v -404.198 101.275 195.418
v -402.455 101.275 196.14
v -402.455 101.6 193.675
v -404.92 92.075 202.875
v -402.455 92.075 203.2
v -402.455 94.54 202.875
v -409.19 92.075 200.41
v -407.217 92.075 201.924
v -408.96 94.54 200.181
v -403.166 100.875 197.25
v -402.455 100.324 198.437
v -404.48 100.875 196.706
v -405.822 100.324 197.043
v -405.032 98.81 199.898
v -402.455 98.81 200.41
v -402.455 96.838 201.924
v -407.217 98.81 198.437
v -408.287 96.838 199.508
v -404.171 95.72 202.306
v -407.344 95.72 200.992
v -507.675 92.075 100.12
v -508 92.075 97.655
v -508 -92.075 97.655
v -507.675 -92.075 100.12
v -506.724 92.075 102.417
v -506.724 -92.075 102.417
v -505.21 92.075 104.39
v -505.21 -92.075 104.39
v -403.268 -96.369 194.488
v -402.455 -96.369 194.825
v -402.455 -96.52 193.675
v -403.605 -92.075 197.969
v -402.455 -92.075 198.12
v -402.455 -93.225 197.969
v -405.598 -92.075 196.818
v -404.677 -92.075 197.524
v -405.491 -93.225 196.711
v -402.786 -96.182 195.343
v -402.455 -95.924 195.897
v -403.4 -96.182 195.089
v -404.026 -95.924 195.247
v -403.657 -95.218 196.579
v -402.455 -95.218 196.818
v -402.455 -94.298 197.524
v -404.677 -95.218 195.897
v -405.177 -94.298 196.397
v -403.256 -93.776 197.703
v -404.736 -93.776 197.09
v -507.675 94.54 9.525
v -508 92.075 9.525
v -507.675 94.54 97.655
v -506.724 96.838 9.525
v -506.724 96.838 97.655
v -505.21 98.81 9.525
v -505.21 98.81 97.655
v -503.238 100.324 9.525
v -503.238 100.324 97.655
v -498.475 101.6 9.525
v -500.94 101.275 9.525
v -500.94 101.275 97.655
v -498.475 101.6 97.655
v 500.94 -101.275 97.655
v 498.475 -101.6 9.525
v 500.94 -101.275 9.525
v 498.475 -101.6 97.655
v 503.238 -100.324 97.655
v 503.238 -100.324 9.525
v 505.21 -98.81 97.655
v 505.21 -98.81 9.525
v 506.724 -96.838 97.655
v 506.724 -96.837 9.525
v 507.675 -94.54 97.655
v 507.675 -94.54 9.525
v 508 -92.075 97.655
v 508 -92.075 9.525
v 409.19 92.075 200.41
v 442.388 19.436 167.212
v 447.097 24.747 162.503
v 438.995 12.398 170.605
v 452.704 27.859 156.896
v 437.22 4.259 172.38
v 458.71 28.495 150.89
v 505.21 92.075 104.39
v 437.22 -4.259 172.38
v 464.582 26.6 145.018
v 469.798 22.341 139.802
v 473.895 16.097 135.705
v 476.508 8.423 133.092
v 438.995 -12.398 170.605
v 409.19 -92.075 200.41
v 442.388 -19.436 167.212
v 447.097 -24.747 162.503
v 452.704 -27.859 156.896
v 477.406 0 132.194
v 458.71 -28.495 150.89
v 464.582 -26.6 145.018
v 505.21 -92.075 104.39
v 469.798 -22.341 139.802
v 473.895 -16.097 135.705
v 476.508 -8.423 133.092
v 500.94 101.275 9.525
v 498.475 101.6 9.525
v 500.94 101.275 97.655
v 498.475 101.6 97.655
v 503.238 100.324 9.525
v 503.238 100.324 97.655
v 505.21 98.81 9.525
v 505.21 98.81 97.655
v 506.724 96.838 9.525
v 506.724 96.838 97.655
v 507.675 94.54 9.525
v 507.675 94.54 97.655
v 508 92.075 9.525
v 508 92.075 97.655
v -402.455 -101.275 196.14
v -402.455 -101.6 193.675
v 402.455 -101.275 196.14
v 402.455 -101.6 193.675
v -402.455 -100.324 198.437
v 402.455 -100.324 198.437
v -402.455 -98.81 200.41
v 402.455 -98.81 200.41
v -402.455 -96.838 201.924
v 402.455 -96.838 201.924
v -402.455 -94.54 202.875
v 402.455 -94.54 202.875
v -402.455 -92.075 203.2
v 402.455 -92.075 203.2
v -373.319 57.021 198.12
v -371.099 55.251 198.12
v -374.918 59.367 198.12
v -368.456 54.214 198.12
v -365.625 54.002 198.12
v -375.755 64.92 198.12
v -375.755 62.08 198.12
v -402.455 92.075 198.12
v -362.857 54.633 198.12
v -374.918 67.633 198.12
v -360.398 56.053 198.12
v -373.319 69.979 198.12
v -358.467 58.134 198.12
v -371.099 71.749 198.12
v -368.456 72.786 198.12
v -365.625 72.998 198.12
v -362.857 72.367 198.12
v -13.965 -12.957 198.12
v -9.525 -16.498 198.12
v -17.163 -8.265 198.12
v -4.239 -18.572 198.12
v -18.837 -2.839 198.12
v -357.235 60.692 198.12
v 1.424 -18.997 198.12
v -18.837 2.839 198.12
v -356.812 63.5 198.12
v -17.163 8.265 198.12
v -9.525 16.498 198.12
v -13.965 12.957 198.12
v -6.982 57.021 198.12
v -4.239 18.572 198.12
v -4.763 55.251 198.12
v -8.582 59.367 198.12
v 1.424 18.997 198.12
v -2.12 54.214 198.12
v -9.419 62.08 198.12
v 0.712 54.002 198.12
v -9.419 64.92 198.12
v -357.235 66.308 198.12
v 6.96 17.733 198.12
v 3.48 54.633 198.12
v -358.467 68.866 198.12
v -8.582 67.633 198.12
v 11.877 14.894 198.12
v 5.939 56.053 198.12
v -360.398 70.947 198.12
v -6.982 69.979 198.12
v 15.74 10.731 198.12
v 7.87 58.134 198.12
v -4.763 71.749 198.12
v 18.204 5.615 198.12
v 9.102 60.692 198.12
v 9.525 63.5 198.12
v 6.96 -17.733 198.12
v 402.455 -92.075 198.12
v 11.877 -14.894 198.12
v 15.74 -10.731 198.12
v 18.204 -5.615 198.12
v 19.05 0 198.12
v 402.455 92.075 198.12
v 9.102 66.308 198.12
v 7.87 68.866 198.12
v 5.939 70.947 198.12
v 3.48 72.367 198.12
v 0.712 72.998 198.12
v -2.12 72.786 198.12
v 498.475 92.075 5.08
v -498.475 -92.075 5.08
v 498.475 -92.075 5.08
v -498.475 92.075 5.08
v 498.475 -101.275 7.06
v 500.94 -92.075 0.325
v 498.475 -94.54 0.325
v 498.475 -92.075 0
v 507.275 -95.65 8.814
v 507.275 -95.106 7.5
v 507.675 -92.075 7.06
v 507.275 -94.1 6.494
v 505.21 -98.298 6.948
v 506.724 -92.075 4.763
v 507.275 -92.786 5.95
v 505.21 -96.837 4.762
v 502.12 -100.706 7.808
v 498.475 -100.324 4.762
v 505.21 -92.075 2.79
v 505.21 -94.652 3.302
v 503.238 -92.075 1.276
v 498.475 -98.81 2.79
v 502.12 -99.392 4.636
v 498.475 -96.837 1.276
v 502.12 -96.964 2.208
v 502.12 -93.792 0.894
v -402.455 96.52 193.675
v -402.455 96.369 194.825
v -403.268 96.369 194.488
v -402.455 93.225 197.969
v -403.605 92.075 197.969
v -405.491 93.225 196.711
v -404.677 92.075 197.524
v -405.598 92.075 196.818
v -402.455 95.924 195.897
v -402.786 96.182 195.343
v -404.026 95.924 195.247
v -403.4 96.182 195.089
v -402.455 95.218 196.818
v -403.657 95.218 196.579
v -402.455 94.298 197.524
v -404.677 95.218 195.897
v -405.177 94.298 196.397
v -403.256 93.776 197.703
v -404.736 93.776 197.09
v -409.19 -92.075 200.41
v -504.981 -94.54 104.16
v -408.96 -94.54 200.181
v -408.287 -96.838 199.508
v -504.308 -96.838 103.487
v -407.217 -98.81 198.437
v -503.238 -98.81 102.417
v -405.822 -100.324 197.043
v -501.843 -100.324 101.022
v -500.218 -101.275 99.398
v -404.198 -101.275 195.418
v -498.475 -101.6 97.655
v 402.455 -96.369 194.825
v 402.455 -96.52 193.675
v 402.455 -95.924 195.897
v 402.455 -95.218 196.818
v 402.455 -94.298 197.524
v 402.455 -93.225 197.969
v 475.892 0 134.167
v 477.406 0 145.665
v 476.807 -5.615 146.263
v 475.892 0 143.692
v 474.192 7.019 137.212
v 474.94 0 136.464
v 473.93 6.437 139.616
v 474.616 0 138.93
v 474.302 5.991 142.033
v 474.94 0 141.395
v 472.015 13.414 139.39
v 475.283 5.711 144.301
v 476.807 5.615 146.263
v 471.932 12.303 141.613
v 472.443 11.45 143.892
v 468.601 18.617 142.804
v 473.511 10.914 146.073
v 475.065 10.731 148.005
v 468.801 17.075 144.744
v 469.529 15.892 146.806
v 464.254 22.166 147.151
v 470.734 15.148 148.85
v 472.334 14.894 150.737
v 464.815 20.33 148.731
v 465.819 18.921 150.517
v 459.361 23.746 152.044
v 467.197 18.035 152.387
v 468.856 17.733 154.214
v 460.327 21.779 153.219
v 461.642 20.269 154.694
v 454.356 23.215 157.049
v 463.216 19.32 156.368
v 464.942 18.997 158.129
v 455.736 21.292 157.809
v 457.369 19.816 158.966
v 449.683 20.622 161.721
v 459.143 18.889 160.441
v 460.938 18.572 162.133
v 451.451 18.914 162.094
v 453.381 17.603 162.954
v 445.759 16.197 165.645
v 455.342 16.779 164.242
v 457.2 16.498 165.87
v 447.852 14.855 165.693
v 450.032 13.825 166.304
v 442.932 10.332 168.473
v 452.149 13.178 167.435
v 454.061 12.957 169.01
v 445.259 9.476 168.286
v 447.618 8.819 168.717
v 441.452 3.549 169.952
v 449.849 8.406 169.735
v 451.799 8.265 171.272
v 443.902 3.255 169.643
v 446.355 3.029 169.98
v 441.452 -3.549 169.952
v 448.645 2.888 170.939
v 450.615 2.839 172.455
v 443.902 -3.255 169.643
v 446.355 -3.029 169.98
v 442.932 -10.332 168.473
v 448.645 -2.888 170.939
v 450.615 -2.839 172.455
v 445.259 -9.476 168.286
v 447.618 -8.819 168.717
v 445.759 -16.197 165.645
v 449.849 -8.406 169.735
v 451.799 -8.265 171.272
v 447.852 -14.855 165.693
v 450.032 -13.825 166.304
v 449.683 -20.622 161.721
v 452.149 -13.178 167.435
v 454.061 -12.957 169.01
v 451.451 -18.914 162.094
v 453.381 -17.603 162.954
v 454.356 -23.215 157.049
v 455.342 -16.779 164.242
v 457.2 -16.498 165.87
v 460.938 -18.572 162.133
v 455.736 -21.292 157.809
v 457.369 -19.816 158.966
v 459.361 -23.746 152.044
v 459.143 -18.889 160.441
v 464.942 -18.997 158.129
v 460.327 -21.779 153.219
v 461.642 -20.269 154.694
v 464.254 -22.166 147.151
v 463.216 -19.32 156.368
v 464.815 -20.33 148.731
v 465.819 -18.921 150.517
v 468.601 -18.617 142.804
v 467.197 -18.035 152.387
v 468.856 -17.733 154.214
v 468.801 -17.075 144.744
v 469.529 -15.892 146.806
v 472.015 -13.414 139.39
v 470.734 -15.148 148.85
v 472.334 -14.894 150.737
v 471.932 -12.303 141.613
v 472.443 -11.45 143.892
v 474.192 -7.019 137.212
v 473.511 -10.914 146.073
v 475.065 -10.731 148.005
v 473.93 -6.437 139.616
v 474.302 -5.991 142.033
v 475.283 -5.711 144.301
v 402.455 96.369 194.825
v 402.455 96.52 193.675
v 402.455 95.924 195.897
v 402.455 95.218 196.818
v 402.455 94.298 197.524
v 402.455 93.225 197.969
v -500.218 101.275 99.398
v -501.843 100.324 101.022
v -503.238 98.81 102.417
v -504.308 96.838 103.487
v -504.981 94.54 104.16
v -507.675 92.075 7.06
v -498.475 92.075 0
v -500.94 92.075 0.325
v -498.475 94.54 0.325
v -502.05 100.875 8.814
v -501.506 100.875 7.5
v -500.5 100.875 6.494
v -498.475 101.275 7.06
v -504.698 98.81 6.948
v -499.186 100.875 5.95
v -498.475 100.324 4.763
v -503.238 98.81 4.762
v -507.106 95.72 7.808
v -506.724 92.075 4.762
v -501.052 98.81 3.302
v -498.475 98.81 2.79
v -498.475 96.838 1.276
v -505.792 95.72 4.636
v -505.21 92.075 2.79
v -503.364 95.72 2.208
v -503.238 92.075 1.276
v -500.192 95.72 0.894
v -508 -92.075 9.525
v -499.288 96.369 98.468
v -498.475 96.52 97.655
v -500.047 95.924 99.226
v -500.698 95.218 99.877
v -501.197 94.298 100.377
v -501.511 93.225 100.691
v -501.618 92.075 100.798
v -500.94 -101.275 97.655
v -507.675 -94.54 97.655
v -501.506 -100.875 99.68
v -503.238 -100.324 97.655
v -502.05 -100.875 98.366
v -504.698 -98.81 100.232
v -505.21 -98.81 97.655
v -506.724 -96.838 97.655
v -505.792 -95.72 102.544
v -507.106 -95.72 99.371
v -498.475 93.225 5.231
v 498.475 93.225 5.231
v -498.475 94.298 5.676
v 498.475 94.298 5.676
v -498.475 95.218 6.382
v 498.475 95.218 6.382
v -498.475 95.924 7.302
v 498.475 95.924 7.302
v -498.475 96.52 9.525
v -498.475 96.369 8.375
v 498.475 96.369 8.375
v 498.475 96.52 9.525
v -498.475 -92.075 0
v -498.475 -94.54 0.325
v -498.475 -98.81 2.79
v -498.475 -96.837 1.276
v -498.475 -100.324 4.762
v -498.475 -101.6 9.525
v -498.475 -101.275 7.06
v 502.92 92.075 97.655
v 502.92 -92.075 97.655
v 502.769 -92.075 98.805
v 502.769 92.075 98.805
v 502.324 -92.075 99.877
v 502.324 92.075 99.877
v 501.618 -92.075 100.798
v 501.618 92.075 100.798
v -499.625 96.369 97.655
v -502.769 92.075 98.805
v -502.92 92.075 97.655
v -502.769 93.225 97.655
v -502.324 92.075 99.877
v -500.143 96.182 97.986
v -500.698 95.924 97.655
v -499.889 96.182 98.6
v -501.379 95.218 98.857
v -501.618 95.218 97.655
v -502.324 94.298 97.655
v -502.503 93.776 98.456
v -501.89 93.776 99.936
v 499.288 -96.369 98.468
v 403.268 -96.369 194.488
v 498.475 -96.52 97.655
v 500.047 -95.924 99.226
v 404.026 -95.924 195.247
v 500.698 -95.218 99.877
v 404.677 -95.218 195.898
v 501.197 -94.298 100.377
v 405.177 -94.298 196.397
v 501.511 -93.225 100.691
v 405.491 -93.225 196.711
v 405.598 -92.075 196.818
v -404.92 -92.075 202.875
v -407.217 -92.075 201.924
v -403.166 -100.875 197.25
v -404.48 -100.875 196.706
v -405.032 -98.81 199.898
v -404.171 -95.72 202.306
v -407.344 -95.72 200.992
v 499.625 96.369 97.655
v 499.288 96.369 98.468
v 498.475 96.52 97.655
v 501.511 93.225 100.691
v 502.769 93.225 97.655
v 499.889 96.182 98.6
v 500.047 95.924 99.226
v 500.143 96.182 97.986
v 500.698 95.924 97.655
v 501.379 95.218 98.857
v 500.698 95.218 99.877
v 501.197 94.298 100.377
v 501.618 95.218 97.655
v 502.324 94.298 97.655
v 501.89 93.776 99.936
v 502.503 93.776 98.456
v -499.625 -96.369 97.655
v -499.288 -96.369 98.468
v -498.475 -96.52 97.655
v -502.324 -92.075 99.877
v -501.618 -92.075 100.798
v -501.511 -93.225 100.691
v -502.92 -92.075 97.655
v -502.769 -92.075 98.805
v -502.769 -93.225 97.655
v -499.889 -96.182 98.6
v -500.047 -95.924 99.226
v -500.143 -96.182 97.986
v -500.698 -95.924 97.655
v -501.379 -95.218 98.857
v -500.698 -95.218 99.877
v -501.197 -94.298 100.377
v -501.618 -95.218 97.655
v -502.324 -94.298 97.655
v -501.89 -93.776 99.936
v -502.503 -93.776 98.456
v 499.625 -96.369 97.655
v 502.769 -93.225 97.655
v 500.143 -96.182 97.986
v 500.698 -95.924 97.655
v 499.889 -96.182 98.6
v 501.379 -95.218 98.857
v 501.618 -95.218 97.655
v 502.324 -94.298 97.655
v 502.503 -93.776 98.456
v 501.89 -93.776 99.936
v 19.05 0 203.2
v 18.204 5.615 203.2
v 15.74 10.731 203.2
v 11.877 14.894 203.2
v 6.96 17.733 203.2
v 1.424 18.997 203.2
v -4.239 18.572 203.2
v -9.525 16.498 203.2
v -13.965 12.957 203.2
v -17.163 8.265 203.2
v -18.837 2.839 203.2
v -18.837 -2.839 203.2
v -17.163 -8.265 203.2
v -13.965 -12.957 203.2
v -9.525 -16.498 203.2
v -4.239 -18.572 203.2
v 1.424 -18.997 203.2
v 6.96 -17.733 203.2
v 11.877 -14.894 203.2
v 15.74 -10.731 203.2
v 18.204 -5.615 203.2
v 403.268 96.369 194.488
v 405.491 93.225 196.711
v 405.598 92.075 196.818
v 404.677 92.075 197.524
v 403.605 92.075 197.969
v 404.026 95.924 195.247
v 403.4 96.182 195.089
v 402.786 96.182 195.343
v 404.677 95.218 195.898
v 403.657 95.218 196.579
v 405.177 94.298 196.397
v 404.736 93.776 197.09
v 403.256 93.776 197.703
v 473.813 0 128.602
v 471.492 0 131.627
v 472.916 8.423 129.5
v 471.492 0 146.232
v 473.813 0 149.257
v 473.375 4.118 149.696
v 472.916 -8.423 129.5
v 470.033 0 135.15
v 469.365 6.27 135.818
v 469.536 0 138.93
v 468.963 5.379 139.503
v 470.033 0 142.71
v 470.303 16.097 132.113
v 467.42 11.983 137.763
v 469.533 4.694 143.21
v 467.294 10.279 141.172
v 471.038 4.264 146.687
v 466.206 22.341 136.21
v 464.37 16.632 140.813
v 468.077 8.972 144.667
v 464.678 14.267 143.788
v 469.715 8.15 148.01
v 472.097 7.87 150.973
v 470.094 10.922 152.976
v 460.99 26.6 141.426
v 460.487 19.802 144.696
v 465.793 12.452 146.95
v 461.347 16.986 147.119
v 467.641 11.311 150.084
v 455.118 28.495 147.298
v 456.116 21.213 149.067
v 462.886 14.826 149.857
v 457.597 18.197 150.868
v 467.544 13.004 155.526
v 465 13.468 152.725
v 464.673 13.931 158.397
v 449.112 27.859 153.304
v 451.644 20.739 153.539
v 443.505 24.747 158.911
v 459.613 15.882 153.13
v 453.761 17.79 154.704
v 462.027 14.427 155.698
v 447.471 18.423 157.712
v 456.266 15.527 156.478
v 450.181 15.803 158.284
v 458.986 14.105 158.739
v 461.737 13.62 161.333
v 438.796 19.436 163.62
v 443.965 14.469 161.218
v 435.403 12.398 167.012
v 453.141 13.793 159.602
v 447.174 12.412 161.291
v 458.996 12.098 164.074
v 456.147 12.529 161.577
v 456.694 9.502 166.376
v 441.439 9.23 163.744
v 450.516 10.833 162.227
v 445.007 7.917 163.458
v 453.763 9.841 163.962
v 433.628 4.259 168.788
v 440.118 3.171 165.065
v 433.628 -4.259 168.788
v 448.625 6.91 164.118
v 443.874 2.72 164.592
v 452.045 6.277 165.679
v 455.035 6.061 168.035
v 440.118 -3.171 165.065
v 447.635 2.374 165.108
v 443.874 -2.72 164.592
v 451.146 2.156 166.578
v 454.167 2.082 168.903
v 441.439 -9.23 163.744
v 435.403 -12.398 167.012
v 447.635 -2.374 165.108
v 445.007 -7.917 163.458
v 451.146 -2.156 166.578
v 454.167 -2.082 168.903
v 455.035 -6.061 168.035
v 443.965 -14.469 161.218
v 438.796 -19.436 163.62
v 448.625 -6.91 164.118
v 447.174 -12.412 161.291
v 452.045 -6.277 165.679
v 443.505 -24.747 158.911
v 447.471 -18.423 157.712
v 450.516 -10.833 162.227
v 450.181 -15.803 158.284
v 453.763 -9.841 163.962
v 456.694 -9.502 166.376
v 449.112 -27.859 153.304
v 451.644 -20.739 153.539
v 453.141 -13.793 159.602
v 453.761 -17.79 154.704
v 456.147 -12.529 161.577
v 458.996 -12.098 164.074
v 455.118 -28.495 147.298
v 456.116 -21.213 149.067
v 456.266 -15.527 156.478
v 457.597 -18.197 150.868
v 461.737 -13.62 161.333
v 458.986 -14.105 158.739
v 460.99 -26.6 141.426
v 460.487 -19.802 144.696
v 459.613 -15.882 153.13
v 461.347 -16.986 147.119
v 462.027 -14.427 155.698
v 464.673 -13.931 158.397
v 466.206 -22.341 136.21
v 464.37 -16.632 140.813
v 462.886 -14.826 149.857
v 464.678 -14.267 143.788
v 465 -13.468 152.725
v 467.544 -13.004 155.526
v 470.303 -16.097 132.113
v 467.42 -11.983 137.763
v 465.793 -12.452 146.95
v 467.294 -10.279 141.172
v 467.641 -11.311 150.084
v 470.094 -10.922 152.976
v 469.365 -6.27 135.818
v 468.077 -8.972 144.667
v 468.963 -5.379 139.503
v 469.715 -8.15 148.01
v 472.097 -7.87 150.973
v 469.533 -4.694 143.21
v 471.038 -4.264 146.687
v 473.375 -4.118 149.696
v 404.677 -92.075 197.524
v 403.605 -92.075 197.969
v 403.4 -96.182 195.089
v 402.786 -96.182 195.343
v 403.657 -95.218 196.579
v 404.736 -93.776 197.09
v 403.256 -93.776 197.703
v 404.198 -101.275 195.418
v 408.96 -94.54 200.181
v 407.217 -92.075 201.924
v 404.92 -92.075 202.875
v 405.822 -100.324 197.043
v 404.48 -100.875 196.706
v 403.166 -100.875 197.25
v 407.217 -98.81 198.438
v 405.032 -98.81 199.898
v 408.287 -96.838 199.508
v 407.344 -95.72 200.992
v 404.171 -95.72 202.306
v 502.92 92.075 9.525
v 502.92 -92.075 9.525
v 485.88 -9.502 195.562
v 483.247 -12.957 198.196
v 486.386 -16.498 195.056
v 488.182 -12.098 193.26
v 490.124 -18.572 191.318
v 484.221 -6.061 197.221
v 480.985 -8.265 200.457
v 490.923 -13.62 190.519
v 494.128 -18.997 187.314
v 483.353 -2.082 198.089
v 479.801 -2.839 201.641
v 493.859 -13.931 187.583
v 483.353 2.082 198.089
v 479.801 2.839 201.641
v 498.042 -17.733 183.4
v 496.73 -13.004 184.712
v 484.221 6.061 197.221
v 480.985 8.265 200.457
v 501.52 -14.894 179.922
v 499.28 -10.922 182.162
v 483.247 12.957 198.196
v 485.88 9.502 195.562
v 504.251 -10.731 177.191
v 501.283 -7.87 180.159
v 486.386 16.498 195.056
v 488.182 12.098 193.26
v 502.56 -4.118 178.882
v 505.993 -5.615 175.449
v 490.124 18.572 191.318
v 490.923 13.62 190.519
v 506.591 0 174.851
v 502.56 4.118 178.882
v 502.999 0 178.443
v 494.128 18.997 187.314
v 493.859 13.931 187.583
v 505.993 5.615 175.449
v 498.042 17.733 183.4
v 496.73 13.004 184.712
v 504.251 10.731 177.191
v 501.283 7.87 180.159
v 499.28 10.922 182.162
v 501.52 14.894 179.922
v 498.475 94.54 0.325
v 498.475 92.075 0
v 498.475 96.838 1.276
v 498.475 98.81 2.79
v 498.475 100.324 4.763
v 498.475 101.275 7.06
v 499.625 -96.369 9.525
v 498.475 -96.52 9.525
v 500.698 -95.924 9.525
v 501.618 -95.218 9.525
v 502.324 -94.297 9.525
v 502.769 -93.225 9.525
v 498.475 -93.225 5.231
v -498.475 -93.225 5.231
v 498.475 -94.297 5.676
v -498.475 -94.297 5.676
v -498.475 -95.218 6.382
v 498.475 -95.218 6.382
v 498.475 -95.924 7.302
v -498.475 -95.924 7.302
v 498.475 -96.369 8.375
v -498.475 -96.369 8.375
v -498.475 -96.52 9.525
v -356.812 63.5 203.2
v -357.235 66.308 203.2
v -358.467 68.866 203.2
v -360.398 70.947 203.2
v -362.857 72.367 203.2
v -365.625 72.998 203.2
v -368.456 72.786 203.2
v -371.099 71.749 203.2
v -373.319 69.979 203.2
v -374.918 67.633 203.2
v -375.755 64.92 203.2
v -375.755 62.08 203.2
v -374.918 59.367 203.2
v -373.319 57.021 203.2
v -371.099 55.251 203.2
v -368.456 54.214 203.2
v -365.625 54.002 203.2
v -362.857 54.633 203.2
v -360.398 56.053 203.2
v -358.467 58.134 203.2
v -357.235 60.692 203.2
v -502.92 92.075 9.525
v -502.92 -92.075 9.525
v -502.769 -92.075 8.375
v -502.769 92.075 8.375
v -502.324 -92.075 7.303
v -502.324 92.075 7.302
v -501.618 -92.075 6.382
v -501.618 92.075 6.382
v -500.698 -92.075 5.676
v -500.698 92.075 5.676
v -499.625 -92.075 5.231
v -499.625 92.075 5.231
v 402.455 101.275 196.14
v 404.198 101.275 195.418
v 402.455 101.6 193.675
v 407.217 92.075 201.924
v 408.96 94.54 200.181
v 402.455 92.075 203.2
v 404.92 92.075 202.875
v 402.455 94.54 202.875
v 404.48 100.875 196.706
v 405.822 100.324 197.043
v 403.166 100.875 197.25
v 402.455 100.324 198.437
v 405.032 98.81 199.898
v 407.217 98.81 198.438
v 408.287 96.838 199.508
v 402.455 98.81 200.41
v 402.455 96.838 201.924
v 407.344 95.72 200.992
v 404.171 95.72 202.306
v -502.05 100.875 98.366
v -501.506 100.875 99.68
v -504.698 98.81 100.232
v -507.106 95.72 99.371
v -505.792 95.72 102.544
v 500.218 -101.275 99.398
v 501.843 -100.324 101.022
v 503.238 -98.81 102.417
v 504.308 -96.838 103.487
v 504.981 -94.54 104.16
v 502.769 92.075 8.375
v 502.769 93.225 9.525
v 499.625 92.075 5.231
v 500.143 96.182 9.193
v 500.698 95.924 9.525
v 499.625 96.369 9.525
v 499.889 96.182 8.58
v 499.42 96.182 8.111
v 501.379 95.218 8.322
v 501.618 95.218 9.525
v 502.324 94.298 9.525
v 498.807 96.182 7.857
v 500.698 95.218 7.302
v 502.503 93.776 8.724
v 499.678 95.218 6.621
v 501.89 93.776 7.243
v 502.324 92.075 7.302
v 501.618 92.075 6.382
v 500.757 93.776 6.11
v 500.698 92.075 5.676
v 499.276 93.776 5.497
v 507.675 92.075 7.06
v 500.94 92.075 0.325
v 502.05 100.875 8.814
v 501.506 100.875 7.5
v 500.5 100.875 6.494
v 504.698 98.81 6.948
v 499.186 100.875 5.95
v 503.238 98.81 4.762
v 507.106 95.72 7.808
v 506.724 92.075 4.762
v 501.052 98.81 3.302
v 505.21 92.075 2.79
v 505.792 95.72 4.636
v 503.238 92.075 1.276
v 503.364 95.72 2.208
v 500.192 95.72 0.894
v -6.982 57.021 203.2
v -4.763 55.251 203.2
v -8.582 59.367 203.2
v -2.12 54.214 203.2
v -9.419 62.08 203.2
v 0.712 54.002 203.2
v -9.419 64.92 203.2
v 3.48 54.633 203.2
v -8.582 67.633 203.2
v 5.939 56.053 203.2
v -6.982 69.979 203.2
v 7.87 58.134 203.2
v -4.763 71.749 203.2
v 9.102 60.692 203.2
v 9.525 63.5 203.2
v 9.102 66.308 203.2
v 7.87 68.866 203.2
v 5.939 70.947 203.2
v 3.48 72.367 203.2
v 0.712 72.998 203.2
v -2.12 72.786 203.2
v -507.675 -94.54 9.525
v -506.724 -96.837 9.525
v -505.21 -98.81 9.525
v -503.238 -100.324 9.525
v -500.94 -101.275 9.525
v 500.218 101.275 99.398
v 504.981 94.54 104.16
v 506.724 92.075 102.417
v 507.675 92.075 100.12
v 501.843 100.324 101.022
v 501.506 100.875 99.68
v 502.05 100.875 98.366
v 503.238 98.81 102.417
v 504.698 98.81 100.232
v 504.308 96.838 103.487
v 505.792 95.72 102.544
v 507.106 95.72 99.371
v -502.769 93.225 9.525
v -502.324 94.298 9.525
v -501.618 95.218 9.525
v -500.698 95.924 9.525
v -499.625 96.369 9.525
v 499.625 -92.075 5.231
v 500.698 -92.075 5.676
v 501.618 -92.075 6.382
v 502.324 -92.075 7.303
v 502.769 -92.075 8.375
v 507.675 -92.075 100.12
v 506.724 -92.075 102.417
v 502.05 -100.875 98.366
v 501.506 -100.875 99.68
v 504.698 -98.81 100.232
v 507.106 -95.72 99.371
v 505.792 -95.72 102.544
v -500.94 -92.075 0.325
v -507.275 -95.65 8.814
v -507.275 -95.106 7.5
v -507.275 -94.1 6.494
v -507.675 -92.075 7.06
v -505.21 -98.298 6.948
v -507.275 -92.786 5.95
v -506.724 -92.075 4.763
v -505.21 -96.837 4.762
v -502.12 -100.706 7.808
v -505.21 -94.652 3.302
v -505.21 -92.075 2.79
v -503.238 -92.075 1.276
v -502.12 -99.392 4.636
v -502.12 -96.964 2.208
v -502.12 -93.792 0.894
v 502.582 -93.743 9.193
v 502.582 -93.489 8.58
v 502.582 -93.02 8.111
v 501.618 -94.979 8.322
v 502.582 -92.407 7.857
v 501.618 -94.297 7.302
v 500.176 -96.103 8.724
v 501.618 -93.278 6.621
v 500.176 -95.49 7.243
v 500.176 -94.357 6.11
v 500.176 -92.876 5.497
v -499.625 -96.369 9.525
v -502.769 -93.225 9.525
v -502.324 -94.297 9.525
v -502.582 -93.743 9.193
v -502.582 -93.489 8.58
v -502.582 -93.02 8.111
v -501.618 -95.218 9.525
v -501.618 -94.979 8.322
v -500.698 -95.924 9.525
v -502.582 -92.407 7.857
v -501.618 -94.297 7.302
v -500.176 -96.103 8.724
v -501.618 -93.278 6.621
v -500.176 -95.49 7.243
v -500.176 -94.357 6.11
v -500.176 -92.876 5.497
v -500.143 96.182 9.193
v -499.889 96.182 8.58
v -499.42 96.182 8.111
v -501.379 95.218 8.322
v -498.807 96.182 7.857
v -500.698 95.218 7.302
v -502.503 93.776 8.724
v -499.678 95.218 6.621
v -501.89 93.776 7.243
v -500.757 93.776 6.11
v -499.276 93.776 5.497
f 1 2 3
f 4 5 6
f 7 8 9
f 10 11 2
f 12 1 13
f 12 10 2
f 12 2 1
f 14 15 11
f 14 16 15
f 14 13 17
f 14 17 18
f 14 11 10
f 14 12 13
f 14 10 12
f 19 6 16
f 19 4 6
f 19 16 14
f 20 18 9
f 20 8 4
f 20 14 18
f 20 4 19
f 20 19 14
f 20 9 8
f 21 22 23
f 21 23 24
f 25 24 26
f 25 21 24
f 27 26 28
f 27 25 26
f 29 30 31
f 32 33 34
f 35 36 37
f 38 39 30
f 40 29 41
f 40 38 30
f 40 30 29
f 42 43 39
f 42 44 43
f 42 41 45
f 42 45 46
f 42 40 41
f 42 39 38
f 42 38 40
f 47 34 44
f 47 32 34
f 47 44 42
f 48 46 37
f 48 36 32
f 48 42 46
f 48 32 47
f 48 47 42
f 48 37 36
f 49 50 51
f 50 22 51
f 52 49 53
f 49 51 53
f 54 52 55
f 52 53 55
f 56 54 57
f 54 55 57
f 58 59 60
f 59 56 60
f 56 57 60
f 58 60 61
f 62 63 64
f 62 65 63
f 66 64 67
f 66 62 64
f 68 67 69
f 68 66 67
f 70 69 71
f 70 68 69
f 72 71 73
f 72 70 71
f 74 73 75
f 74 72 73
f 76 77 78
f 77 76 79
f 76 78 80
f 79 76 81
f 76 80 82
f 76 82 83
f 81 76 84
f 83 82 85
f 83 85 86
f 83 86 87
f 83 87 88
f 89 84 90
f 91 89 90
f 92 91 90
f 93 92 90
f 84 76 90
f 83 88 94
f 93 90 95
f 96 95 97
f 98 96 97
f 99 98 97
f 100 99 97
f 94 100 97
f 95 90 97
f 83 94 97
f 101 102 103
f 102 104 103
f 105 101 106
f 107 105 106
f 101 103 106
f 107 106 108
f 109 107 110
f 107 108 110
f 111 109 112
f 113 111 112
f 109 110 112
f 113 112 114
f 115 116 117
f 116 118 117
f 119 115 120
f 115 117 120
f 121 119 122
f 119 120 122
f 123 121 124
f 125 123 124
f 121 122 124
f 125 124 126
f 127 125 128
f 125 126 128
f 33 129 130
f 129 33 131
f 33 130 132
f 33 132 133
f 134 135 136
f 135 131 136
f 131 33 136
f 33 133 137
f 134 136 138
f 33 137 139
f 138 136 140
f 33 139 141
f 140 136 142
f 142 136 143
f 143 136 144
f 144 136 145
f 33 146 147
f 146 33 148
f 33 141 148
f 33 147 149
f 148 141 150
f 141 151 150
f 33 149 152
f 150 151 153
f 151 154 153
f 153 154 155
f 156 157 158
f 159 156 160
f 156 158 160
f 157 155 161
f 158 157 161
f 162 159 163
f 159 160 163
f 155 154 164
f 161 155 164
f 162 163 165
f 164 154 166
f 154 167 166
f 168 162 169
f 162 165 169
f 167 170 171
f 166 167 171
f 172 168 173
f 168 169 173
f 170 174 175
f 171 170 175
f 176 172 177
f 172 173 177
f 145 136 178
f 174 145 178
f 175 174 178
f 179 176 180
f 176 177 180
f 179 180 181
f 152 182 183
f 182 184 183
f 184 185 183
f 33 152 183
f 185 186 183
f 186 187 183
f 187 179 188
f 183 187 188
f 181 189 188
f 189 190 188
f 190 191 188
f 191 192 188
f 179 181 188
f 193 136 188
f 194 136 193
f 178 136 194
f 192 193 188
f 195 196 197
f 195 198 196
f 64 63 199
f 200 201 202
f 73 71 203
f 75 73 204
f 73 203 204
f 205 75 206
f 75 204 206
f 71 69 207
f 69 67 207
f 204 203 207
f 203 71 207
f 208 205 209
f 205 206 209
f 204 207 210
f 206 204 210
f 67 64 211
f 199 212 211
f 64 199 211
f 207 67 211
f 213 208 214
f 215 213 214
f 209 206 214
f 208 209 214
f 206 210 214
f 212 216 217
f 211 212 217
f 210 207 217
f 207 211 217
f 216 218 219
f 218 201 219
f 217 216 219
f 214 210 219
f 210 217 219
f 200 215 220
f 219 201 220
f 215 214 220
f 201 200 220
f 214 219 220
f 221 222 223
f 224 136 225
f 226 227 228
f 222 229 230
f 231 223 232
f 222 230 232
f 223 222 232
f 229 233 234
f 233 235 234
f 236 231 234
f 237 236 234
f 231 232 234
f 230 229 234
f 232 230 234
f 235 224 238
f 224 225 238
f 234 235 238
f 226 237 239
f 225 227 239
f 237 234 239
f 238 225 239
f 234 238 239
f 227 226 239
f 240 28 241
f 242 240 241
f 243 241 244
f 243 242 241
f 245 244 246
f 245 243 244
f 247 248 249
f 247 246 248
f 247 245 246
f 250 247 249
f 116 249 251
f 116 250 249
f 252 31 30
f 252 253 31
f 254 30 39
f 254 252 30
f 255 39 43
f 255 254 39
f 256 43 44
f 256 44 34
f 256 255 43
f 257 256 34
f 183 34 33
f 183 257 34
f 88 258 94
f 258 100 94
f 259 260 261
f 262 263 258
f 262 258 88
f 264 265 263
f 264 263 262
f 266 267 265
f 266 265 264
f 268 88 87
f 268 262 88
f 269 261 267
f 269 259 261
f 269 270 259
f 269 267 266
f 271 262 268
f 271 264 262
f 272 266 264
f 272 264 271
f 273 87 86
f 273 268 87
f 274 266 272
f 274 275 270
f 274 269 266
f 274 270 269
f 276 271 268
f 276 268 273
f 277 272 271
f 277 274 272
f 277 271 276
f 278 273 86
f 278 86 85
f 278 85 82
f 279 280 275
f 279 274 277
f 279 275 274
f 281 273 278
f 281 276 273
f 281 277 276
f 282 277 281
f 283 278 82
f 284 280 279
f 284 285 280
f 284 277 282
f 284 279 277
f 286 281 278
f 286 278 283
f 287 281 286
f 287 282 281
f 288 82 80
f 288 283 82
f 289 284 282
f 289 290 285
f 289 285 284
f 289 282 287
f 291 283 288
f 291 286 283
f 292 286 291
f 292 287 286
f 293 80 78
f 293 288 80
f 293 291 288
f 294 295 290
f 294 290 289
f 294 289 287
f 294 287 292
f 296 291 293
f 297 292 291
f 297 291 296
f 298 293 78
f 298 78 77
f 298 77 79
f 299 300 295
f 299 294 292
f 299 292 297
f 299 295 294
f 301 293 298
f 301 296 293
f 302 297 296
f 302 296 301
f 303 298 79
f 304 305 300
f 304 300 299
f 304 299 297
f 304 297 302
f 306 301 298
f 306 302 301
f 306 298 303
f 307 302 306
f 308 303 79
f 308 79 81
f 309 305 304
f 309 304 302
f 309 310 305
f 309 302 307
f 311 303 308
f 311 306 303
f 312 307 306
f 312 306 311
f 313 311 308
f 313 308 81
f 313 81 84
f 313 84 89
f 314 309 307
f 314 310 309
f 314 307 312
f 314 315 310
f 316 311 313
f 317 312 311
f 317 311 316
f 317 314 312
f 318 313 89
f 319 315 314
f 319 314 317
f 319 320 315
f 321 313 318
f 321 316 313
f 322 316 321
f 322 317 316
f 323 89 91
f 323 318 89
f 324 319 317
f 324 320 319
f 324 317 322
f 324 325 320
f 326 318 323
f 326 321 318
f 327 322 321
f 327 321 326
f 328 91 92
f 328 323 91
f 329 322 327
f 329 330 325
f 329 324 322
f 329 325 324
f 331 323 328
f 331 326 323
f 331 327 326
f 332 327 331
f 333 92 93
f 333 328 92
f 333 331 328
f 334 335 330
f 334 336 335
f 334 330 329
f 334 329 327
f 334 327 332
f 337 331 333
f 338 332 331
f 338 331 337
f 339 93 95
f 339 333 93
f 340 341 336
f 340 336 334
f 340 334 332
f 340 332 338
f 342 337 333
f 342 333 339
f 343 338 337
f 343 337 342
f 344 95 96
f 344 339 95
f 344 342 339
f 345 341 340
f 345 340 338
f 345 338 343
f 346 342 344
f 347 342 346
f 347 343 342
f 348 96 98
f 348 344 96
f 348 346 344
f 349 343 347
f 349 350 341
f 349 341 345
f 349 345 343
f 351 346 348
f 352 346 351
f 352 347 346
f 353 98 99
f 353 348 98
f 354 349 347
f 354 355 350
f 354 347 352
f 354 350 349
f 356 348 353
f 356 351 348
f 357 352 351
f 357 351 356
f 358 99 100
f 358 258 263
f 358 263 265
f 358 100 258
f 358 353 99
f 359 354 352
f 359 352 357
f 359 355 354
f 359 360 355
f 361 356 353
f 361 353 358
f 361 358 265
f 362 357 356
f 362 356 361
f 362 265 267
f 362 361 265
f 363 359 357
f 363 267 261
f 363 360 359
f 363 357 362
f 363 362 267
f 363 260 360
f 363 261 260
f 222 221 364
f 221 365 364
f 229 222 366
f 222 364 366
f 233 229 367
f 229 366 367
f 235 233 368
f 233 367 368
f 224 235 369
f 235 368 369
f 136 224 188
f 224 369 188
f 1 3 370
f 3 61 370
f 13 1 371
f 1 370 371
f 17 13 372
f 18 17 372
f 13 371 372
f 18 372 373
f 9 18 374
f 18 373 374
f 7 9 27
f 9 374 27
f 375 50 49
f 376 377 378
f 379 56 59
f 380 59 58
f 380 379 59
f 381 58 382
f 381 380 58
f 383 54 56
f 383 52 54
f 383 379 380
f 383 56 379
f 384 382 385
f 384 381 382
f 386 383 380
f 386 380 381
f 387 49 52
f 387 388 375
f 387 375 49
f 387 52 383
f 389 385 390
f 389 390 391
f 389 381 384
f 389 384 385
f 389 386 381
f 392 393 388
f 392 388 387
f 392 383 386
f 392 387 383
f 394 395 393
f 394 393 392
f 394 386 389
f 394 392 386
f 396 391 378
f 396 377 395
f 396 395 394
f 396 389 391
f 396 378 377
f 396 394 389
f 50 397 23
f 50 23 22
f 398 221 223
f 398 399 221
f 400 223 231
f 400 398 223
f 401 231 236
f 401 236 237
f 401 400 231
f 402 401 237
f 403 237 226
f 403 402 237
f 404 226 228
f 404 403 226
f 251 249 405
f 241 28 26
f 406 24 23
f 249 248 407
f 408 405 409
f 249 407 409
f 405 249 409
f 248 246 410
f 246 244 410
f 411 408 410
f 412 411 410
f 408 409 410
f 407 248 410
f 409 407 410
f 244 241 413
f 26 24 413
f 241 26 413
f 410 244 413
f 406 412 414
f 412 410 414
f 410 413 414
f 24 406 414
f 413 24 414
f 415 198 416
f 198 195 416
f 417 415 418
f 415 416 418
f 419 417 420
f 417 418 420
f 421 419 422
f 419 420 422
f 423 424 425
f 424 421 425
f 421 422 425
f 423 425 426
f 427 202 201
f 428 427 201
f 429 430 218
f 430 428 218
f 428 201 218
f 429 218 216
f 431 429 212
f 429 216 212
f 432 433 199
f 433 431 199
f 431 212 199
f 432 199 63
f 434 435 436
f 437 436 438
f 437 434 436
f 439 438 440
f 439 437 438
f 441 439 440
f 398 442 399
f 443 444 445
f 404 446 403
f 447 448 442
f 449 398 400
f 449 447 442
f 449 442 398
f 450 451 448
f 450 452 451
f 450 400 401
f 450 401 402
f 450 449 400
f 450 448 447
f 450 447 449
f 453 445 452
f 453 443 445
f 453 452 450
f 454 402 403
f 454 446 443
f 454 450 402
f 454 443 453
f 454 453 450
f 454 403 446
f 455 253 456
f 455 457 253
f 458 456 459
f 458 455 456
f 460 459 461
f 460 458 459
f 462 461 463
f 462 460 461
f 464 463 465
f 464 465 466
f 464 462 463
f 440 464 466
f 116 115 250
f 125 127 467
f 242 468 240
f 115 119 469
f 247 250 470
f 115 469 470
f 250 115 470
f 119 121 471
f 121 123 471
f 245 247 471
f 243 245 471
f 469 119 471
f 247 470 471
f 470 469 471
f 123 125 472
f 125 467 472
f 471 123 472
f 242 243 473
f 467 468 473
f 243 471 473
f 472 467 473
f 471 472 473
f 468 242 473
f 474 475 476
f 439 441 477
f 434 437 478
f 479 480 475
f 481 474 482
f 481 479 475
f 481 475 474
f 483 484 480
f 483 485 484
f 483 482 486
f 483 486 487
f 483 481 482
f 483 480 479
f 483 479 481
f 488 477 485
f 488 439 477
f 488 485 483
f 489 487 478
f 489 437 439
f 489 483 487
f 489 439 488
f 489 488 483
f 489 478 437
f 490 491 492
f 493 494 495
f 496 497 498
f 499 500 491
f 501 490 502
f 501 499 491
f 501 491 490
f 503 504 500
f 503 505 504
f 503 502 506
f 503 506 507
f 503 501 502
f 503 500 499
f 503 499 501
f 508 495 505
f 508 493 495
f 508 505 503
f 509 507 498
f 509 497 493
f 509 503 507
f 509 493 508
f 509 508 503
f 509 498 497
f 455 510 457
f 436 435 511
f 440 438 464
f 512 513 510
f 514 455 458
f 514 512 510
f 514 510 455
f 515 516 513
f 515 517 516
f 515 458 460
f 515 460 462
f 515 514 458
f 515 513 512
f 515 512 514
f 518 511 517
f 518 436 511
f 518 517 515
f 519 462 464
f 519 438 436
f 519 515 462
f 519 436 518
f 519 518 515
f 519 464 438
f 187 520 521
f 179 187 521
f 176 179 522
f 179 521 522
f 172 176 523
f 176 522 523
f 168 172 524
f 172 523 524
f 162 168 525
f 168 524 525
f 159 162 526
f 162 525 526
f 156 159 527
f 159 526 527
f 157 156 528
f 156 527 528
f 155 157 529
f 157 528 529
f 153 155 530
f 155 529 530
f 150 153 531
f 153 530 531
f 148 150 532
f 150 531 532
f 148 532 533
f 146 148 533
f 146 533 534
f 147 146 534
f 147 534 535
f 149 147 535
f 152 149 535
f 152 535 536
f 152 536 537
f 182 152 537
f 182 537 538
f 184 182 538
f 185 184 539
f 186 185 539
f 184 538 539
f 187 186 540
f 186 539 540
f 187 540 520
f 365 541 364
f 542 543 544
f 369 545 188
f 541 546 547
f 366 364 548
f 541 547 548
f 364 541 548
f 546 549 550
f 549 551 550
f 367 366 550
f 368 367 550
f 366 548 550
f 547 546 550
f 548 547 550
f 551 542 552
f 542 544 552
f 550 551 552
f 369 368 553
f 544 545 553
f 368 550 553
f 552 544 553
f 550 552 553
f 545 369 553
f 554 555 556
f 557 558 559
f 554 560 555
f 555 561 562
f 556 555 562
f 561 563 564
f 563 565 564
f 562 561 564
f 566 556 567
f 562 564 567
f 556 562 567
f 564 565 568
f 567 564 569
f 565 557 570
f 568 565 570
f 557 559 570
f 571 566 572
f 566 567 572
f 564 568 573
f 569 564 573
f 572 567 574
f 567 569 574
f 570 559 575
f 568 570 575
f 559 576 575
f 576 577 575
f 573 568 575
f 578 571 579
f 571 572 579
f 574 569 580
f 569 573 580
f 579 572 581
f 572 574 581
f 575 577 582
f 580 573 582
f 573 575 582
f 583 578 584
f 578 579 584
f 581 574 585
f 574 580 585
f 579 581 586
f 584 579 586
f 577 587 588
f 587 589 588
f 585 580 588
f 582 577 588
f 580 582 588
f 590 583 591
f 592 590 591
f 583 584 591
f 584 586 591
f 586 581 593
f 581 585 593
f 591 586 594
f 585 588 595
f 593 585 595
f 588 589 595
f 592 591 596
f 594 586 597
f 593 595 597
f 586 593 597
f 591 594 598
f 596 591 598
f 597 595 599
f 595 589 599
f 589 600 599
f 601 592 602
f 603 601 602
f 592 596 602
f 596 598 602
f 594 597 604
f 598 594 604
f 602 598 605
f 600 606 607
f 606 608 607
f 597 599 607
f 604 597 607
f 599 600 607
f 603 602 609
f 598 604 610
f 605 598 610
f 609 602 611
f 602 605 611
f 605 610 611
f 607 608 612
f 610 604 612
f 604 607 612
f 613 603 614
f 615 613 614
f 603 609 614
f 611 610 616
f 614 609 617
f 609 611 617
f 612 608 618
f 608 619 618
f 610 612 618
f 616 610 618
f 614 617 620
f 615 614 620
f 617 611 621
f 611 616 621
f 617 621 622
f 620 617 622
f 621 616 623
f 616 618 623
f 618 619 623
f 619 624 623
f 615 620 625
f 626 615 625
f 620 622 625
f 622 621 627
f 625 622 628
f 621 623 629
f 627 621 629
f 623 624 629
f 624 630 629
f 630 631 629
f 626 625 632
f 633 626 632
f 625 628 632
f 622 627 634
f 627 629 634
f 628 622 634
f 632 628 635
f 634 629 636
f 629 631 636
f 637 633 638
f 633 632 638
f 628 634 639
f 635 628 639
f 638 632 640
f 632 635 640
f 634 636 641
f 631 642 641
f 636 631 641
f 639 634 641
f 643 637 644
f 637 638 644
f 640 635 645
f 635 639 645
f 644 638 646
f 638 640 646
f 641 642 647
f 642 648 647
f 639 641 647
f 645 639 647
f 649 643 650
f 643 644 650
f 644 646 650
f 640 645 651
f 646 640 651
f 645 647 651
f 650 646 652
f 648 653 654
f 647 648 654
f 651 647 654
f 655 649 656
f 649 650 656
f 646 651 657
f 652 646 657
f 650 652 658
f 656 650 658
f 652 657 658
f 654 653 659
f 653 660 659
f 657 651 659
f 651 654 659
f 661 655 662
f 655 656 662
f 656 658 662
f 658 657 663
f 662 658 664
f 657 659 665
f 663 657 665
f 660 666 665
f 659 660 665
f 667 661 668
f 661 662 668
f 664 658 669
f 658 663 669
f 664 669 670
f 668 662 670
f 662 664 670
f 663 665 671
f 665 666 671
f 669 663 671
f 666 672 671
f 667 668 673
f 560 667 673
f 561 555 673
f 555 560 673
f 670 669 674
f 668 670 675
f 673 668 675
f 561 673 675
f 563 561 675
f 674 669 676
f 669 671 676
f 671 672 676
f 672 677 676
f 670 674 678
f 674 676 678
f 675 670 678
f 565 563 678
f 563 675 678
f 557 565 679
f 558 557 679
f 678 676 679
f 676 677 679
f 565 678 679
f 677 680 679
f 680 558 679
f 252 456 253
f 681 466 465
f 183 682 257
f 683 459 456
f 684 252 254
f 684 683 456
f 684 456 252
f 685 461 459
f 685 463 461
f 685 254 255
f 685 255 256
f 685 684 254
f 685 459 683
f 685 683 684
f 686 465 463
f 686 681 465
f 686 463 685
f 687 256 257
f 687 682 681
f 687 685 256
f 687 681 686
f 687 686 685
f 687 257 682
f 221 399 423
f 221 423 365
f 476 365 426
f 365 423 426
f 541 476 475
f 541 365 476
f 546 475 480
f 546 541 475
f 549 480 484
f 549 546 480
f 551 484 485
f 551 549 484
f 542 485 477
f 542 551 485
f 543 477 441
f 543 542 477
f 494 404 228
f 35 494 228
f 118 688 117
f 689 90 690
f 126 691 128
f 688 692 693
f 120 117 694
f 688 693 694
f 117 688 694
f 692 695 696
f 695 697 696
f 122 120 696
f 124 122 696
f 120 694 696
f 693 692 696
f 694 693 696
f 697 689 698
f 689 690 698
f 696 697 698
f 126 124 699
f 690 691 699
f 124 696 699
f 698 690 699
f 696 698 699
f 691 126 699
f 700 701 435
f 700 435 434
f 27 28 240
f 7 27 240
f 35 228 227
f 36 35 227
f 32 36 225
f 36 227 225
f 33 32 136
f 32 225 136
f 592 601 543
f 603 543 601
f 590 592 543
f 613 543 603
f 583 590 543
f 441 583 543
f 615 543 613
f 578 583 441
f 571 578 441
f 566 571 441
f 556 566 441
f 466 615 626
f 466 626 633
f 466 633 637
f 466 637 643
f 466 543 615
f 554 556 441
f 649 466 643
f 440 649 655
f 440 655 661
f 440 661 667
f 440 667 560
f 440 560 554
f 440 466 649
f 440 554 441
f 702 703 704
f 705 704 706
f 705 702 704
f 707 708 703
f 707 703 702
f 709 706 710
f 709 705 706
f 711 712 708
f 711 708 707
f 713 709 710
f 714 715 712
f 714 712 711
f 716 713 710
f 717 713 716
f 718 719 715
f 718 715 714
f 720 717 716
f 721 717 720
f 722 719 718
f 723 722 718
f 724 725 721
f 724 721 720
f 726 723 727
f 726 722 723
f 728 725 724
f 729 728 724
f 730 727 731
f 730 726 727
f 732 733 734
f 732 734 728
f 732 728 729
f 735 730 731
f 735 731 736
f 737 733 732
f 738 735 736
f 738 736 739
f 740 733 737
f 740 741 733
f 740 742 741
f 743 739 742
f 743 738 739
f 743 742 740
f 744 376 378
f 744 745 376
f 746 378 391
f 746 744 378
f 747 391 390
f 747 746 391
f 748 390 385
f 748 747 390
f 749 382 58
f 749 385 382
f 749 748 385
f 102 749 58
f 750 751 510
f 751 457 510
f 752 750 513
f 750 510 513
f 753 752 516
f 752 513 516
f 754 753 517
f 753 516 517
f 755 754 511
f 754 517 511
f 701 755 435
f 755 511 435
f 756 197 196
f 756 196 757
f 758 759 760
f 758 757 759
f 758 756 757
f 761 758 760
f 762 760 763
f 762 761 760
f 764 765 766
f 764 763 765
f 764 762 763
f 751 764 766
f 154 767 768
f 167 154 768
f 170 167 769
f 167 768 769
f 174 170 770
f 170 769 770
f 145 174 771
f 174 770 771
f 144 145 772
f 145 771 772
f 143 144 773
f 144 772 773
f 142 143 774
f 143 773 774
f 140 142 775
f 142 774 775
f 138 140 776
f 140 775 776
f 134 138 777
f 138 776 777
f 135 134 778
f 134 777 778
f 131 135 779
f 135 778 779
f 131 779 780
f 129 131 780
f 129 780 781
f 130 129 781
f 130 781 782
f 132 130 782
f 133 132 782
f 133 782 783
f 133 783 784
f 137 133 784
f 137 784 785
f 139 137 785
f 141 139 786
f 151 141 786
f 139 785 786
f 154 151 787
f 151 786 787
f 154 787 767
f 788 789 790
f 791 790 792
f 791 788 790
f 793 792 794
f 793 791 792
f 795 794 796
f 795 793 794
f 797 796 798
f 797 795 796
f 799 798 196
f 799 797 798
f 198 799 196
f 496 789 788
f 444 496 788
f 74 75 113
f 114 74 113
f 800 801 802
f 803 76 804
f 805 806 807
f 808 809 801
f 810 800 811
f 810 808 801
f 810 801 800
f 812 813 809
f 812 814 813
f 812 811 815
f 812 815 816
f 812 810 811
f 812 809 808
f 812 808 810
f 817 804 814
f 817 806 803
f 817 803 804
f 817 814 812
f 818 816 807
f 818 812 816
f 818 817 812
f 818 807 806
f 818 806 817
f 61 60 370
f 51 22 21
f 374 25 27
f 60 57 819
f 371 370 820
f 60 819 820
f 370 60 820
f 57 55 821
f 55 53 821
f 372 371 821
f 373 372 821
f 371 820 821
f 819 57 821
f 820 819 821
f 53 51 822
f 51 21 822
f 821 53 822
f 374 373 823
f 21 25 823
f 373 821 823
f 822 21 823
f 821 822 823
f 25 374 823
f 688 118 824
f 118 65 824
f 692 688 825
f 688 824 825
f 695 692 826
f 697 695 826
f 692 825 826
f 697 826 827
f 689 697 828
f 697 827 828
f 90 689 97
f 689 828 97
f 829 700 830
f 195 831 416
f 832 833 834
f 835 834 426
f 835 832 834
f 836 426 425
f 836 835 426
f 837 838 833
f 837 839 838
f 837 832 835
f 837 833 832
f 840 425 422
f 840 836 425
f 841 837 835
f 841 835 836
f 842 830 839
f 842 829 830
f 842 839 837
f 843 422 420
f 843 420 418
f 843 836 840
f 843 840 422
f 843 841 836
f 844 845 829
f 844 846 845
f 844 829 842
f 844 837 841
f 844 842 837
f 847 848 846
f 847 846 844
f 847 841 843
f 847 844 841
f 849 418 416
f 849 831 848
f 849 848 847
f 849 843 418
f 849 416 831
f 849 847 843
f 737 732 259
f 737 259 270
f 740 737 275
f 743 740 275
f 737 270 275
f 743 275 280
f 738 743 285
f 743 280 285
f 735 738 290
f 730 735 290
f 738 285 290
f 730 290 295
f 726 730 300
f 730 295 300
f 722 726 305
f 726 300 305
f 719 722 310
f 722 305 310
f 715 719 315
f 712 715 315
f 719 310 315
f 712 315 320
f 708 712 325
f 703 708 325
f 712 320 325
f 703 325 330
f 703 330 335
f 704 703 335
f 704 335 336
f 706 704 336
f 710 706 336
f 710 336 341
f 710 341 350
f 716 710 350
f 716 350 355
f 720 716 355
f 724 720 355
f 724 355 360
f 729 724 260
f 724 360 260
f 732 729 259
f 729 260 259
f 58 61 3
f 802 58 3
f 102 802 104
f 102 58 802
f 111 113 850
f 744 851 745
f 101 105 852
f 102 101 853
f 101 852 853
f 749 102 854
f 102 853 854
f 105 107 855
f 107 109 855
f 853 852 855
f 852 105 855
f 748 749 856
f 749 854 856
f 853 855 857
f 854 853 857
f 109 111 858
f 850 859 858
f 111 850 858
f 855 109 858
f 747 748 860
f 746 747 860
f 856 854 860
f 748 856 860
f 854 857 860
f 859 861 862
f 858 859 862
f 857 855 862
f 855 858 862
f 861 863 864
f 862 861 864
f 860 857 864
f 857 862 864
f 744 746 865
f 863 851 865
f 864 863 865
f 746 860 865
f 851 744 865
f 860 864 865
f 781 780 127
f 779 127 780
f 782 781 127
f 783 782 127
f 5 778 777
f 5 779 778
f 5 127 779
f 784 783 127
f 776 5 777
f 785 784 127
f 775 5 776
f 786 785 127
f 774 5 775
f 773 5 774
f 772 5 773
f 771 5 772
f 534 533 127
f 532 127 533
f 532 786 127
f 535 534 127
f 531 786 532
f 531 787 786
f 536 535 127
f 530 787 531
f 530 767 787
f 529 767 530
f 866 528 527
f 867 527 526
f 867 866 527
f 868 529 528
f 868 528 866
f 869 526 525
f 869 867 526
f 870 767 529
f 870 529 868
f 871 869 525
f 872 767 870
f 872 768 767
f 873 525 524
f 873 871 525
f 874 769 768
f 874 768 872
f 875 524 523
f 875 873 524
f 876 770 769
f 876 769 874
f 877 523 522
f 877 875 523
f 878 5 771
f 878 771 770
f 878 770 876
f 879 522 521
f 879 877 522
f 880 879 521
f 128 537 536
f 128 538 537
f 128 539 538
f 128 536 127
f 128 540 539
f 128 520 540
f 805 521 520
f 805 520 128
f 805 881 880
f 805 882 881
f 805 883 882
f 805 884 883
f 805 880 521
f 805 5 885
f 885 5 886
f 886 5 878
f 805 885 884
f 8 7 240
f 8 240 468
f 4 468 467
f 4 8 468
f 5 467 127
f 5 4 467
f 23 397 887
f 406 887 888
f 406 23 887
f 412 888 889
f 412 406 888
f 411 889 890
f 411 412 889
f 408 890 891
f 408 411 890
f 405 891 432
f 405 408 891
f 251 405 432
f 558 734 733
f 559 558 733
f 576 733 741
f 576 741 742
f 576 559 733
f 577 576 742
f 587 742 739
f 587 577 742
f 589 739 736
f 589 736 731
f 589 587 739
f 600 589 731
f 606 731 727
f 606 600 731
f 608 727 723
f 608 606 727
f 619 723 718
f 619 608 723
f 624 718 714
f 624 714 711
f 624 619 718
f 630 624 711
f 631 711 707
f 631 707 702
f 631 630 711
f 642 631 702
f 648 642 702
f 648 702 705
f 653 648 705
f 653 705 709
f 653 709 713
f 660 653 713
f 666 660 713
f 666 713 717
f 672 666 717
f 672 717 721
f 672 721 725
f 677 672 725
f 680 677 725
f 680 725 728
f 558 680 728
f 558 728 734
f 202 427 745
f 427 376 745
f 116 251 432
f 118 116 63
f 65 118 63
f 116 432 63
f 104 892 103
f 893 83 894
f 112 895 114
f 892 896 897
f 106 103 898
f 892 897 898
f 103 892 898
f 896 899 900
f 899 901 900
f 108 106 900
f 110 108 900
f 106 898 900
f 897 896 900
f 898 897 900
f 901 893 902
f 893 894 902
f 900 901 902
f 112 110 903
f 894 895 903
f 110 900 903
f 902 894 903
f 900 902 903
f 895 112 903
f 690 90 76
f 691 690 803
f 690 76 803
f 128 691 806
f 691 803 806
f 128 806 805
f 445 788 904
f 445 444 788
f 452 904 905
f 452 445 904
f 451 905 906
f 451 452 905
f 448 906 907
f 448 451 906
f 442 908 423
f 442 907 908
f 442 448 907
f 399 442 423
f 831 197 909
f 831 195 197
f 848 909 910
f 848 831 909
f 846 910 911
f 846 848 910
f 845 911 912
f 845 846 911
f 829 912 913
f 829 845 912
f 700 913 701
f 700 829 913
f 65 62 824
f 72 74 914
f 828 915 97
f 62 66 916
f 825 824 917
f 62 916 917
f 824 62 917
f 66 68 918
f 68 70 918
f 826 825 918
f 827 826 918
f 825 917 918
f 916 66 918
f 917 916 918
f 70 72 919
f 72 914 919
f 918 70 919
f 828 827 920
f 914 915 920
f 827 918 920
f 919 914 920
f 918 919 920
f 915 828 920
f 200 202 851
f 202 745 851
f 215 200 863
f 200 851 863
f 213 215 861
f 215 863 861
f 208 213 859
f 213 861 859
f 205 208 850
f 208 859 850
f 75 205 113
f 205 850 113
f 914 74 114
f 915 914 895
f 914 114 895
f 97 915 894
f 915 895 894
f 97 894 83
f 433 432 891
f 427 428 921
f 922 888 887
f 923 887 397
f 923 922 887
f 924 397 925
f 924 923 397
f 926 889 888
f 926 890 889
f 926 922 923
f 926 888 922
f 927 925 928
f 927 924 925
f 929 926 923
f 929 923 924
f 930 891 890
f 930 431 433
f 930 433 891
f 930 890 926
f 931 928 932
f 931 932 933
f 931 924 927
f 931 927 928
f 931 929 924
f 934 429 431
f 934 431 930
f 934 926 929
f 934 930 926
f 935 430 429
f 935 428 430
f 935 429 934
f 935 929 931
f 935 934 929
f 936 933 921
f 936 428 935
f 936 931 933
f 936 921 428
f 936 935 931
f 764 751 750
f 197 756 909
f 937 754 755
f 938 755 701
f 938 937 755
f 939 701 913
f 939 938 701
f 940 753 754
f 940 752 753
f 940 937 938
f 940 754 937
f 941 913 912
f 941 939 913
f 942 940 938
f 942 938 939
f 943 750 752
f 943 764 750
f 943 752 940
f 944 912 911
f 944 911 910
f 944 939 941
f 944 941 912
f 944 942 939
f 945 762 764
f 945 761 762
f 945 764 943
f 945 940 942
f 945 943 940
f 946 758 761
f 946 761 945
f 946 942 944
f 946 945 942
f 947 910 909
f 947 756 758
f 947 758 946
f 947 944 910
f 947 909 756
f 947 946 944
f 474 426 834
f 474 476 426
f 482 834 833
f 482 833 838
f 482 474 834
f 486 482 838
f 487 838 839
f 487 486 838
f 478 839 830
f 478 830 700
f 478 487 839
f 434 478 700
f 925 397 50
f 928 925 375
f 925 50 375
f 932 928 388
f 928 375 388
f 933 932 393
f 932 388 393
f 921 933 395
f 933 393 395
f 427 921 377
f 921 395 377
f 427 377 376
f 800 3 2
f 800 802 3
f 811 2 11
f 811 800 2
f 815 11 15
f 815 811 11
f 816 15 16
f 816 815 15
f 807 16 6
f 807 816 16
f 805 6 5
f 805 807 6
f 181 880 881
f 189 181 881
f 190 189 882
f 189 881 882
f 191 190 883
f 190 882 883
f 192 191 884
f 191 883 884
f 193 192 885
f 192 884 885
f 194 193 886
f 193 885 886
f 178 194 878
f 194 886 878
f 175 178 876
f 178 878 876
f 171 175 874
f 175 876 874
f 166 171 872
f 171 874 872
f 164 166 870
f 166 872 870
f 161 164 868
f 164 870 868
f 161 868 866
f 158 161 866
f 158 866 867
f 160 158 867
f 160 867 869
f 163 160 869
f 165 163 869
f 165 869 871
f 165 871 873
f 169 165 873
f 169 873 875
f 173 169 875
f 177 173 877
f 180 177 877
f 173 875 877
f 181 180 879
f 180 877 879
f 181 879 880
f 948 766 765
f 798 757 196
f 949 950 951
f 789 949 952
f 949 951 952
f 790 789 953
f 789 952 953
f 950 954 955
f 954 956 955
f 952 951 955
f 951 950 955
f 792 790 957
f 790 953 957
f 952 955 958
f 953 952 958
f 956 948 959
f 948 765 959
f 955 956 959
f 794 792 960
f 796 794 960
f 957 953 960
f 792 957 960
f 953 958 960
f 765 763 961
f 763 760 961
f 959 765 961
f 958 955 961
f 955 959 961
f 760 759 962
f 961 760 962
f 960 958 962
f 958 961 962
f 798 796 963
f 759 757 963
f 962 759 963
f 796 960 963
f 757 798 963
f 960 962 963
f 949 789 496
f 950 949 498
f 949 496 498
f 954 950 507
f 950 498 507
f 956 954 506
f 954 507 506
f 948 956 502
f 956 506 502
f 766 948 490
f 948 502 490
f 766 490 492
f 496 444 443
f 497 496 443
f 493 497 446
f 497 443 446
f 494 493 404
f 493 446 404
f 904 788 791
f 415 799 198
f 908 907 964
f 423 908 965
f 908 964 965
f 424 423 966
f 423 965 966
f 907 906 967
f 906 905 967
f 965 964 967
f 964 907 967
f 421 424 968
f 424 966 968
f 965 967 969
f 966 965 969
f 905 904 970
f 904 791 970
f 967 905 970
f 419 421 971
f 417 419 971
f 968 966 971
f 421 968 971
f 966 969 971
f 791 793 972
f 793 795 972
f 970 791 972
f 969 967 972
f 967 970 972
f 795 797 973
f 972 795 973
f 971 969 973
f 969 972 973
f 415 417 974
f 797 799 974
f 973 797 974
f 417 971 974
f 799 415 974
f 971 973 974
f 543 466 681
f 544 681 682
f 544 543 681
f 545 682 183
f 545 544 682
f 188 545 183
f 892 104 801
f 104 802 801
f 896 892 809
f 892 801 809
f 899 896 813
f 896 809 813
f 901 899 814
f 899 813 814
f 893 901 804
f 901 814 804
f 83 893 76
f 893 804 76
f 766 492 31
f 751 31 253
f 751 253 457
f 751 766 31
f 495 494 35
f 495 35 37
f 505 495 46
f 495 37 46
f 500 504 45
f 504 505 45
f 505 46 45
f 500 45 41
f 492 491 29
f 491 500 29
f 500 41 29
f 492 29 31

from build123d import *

# Parameters (mm, degrees)
F0_W     = 1016
F0_H     = 203.2
F1_DEPTH = 203.2
F3_DEPTH = 203.201
F4_R     = 19.05
F5_DEPTH = 50.8
F6_R     = 9.525
F7_T     = -5.08
F8_R     = 9.525
F8_R_2   = 19.05
F9_DEPTH = 5.08


with BuildPart() as f1:
    # F0 (on Top) → F1 (new body)
    with BuildSketch(Plane.XY):
        Rectangle(F0_W, F0_H)
    extrude(amount=F1_DEPTH)

    # F2 (on face) → F3 (cut, through all)
    with BuildSketch(Plane.XZ.offset(101.6)):
        Polygon((-508, 203.2), (-508, 101.6), (-406.4, 203.2), align=None)
        Polygon((508, 203.2), (406.4, 203.2), (508, 101.6), align=None)
    extrude(amount=-F3_DEPTH, mode=Mode.SUBTRACT)

    # F4 (on face) → F5 (join)
    with BuildSketch(Plane(origin=(304.8, 0, 304.8), x_dir=(0.7071067812, 0, -0.7071067812), z_dir=(0.7071067812, 0, 0.7071067812))):
        with Locations((215.5261469057, 0)):
            Circle(F4_R)
    extrude(amount=F5_DEPTH)

    # F6
    f6_edges = [f1.edges().sort_by_distance(p)[0] for p in [
        (0, -101.6, 0),
        (508, -101.6, 50.8),
        (457.2, -101.6, 152.4),
        (0, -101.6, 203.2),
        (-457.2, -101.6, 152.4),
        (-508, -101.6, 50.8),
        (406.4, 0, 203.2),
        (508, 0, 101.6),
        (457.2, 101.6, 152.4),
        (443.729616, 0, 165.870384),
        (508, 0, 0),
        (508, 101.6, 50.8),
        (-406.4, 0, 203.2),
        (0, 101.6, 203.2),
        (-508, 0, 0),
        (-508, 0, 101.6),
        (-508, 101.6, 50.8),
        (-457.2, 101.6, 152.4),
        (0, 101.6, 0),
    ]]
    fillet(f6_edges, radius=F6_R)

    # F7
    f7_openings = [f1.faces().sort_by_distance(p)[0] for p in [
        (493.121024, 0, 188.321024),
    ]]
    offset(amount=F7_T, openings=f7_openings)

    # F8 (on face) → F9 (cut)
    with BuildSketch(Plane.XY.offset(203.2)):
        with Locations((-366.3365542889, 63.5)):
            Circle(F8_R)
        with Locations((0, 63.5)):
            Circle(F8_R)
        Circle(F8_R_2)
    extrude(amount=-F9_DEPTH, mode=Mode.SUBTRACT)


solid = f1.part
